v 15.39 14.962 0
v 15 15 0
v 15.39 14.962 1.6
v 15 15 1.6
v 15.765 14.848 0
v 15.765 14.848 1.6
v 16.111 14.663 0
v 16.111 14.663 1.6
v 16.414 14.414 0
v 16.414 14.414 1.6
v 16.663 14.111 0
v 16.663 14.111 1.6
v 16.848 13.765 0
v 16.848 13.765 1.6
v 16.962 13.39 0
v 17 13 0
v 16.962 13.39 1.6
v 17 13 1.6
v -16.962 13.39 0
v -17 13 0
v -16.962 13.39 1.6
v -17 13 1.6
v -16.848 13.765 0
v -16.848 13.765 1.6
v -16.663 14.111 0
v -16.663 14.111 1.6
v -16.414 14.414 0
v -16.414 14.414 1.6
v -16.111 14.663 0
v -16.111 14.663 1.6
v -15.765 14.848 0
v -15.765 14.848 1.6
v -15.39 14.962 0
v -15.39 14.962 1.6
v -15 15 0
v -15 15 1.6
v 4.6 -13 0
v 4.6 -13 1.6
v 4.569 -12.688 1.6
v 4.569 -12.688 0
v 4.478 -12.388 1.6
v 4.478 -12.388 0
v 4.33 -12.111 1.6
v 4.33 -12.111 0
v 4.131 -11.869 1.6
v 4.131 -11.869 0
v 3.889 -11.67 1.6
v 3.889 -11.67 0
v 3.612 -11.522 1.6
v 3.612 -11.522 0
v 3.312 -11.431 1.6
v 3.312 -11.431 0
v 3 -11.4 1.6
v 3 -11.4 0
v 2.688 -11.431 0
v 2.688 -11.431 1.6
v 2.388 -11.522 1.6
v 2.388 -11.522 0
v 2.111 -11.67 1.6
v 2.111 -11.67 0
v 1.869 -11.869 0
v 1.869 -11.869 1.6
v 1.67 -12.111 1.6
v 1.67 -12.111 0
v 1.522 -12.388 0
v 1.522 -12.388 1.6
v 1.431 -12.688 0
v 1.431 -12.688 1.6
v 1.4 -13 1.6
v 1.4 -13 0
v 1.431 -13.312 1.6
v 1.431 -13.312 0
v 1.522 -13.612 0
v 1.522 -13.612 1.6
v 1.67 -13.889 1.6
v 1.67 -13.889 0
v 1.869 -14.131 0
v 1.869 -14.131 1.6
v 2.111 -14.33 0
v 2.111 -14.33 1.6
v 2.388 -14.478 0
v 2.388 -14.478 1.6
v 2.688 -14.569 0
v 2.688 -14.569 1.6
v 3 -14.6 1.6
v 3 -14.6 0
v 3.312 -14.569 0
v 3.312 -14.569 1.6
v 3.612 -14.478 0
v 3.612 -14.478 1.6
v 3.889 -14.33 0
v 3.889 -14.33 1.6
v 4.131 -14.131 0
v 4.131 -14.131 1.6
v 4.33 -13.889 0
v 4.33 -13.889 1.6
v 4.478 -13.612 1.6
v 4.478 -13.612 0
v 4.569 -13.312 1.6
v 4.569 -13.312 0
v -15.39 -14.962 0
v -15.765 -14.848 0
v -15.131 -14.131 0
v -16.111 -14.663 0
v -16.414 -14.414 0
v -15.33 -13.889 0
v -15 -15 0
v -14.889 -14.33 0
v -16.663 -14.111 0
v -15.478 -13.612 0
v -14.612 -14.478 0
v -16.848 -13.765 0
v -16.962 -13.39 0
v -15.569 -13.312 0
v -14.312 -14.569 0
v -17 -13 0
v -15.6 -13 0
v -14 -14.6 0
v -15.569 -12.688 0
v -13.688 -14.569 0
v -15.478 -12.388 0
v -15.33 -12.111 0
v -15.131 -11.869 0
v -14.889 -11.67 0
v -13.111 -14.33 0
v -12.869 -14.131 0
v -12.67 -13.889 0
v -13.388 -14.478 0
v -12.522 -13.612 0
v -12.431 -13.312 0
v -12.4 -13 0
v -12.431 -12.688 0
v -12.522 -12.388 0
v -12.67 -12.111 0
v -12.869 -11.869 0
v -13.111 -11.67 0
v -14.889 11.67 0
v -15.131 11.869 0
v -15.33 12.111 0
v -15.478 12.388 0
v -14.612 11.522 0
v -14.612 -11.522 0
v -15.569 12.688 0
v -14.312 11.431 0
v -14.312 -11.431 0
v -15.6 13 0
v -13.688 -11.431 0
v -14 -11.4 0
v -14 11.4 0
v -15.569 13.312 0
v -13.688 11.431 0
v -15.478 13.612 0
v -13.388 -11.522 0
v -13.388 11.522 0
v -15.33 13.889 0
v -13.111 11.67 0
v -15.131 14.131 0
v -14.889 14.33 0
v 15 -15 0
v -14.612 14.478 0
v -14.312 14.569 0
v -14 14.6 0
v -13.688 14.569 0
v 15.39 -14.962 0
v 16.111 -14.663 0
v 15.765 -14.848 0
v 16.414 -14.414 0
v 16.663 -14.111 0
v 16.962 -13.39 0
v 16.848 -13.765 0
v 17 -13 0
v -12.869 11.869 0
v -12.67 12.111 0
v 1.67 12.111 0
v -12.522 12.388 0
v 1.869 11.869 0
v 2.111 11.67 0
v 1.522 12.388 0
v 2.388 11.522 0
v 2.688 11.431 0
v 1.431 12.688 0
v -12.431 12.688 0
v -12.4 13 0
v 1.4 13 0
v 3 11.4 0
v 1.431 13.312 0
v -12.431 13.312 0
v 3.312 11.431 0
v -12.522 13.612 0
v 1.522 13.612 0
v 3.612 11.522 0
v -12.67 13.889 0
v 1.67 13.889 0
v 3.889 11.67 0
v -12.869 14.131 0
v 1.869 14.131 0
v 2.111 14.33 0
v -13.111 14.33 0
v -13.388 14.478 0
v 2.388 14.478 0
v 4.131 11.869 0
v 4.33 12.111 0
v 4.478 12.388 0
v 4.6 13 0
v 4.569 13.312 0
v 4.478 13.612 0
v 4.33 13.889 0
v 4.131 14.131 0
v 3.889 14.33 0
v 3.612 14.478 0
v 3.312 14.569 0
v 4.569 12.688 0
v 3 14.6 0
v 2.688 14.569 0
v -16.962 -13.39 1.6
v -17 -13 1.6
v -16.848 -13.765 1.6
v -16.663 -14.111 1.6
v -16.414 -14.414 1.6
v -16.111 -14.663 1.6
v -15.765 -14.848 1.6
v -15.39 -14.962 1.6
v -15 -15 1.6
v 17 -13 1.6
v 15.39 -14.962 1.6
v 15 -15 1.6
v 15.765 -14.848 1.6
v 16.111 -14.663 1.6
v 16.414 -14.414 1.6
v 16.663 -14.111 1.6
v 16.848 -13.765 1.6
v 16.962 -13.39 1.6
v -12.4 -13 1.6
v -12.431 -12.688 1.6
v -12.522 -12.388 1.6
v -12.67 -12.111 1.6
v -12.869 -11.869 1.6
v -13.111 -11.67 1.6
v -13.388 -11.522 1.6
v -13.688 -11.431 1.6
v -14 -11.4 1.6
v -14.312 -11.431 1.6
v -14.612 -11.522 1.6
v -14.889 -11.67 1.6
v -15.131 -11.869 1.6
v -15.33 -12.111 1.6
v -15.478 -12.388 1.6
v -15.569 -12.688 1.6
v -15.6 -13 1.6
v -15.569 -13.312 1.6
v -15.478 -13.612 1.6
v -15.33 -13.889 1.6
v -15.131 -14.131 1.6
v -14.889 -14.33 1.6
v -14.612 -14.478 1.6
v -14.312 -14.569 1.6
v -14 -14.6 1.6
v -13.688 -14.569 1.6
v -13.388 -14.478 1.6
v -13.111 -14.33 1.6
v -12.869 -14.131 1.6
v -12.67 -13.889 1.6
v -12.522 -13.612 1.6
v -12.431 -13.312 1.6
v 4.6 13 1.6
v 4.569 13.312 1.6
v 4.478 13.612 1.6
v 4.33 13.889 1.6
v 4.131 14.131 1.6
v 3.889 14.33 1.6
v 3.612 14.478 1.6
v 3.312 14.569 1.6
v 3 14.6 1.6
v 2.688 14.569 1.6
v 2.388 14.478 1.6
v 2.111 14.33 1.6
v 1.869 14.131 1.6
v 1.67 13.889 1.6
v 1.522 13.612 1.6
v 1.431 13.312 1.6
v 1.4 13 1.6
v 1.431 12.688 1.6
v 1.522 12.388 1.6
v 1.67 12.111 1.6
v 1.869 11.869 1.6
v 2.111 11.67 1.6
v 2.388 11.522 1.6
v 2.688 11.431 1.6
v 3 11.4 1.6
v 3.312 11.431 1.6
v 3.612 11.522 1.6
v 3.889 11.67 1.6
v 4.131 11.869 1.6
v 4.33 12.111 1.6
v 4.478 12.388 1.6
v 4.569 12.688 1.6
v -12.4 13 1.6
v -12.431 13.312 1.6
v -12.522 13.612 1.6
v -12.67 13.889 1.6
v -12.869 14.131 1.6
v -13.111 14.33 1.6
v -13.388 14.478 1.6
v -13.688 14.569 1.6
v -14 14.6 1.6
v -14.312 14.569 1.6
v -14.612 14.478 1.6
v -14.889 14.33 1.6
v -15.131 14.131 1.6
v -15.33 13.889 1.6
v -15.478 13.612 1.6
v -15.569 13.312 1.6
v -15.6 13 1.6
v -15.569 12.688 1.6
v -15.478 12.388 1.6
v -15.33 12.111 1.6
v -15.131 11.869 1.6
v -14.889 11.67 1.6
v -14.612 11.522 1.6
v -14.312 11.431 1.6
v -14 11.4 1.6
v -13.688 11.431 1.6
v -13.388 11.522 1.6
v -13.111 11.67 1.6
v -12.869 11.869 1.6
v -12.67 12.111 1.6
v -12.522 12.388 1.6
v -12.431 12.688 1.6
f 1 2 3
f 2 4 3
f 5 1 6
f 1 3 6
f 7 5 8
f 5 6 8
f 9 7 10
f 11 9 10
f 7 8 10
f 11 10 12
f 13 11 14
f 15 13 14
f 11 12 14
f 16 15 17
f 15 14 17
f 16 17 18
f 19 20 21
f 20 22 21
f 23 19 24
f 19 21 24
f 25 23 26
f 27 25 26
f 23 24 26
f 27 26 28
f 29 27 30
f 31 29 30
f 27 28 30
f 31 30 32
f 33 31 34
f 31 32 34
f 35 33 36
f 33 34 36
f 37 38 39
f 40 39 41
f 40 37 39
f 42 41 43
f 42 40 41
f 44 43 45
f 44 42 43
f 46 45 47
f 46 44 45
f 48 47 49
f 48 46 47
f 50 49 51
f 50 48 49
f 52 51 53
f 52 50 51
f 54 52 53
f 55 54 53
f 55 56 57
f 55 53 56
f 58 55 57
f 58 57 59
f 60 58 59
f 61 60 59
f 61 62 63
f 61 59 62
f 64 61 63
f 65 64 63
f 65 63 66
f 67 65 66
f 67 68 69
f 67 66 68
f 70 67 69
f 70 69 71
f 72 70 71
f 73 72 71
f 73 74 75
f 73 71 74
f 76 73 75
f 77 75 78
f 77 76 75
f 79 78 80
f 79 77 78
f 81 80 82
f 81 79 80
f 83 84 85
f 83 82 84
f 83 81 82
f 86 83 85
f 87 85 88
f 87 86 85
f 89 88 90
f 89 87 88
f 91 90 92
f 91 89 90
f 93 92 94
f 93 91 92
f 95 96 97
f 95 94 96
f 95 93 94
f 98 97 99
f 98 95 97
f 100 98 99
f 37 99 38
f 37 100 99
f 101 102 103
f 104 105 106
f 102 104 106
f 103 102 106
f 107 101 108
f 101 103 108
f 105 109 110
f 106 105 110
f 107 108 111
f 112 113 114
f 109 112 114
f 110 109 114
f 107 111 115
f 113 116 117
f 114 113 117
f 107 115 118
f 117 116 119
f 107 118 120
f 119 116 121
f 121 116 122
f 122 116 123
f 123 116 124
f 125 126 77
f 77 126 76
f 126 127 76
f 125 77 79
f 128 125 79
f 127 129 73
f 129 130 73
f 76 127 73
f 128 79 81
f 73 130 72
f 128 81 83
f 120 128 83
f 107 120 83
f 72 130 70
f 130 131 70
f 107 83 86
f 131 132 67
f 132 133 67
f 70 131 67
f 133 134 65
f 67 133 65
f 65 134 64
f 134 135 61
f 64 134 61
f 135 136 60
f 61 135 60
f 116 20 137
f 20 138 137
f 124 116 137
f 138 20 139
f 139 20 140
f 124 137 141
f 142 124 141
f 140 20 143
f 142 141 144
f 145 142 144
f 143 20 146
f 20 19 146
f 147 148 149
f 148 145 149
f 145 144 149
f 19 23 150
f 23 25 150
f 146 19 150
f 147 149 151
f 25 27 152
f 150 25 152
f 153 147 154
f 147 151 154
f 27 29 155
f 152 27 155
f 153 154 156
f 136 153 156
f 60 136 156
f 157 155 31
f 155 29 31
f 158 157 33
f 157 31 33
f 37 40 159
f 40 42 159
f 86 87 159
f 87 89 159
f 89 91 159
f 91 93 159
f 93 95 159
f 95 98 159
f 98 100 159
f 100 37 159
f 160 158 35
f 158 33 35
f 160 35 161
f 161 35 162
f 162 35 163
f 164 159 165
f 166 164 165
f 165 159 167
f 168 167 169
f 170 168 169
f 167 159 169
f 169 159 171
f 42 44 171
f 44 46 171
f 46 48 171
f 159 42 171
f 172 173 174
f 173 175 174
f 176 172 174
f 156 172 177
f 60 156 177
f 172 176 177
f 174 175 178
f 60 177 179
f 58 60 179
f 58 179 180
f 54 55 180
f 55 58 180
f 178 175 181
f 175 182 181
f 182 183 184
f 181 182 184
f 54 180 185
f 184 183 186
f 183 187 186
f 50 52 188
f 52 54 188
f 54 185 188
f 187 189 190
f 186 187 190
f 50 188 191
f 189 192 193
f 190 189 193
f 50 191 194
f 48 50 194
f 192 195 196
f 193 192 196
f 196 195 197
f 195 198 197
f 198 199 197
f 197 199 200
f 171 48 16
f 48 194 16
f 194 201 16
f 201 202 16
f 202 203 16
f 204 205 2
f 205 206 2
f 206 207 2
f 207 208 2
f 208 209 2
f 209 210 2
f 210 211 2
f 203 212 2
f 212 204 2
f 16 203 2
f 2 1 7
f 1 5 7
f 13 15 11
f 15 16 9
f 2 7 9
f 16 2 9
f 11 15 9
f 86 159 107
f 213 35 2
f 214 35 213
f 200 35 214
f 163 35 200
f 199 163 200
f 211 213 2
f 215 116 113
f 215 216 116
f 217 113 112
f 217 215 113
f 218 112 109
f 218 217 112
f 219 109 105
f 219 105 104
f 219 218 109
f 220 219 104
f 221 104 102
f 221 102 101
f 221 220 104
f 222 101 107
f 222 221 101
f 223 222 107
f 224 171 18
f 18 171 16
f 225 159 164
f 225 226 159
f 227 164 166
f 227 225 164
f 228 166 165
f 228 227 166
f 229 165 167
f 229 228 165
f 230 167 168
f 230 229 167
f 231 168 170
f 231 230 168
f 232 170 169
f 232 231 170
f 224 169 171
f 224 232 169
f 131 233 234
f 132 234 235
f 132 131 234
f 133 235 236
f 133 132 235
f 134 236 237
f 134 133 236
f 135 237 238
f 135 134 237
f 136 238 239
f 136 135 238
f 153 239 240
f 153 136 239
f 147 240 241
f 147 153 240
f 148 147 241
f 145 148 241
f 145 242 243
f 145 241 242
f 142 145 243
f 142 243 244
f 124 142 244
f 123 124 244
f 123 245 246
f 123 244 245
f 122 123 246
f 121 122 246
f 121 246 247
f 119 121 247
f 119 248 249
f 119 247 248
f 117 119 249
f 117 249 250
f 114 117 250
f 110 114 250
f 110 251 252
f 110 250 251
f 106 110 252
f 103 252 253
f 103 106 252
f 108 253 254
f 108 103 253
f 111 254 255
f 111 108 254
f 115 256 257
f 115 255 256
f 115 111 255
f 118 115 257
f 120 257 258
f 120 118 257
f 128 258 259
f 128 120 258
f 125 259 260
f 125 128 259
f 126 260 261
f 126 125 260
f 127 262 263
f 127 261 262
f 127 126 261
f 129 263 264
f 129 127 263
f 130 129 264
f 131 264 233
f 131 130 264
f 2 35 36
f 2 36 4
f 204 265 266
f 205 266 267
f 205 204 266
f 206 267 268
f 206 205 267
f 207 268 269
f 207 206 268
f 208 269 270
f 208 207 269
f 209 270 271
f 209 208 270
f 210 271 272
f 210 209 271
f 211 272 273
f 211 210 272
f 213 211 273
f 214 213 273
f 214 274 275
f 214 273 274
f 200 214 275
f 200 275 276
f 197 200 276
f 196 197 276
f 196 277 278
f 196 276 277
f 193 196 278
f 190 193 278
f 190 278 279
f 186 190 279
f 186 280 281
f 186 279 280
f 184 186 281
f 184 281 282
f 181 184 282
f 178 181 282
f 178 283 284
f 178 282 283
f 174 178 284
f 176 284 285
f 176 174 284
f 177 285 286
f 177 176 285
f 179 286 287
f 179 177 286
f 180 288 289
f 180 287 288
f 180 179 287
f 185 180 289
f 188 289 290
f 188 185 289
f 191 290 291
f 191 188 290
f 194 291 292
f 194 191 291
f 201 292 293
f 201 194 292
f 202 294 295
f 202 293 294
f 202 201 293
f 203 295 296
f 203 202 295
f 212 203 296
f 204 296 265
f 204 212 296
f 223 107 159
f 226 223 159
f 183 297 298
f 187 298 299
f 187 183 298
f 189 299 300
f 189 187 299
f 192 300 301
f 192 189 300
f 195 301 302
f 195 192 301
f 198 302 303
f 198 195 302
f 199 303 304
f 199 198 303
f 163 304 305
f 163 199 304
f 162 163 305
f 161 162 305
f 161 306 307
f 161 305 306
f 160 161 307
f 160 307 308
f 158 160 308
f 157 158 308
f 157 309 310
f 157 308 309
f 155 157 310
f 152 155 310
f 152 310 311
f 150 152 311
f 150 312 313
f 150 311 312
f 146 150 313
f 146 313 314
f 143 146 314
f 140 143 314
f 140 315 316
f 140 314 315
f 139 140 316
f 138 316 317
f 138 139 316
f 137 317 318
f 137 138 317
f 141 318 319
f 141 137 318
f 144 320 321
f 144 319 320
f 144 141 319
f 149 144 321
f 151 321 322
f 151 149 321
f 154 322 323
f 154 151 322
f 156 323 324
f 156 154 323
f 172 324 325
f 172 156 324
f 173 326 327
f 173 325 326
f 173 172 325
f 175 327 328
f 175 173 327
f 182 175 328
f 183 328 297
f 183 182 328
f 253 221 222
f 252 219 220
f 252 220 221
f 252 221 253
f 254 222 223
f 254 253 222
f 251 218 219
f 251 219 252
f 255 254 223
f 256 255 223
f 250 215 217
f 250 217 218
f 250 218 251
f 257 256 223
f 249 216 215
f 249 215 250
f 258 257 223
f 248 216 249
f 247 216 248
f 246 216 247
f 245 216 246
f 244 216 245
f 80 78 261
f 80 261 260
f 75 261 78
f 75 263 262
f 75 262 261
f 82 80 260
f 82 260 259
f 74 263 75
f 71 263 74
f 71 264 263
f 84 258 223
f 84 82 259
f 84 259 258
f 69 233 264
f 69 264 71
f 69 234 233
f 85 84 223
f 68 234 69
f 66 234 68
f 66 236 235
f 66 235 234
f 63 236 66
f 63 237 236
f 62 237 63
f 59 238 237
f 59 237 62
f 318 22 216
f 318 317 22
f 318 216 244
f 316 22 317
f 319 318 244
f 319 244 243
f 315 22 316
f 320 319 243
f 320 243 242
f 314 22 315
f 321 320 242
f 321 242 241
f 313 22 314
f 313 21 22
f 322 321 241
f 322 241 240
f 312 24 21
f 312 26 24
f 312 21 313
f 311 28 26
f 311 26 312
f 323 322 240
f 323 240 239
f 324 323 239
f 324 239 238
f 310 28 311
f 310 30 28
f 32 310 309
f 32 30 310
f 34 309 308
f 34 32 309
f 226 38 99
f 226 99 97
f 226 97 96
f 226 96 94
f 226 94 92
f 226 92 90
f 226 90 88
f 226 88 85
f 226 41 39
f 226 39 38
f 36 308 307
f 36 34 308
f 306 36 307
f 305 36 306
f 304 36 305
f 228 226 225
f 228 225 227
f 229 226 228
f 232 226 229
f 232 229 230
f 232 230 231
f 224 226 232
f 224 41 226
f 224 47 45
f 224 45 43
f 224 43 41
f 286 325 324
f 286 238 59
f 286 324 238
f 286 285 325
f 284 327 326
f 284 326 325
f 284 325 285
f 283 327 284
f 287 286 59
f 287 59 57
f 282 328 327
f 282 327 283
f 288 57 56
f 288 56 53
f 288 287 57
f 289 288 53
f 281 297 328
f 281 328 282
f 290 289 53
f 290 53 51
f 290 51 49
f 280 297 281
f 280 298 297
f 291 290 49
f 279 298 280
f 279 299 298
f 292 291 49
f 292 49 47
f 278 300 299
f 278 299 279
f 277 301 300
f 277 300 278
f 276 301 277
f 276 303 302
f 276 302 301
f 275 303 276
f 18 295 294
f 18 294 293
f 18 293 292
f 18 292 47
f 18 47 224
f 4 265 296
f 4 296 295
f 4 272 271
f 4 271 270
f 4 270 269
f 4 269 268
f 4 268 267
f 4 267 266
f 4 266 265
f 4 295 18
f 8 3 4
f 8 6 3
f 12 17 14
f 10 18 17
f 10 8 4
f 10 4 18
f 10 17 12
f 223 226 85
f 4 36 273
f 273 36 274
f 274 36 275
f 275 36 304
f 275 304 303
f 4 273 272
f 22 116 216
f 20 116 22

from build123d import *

# Parameters (mm, degrees)
SKETCH1_W           = 34
SKETCH1_H           = 30
BOSS_EXTRUDE1_DEPTH = 1.6
CUT_EXTRUDE1_REACH  = 24.728
SKETCH2_R           = 1.6
FILLET1_R           = 2


with BuildPart() as part:
    # Sketch1 → Boss-Extrude1 (new body)
    with BuildSketch(Plane.XY):
        Rectangle(SKETCH1_W, SKETCH1_H)
    extrude(amount=BOSS_EXTRUDE1_DEPTH)

    # Sketch2 → Cut-Extrude1 (cut, up to next)
    with BuildSketch(Plane.XY, mode=Mode.PRIVATE) as cut_extrude1_sk1:
        with Locations((-14, 13)):
            Circle(SKETCH2_R)
    cut_extrude1_tool1 = extrude(cut_extrude1_sk1.sketch, amount=CUT_EXTRUDE1_REACH, mode=Mode.PRIVATE) & part.part
    # Sketch2 → Cut-Extrude1 (cut, up to next)
    with BuildSketch(Plane.XY, mode=Mode.PRIVATE) as cut_extrude1_sk2:
        with Locations((3, 13)):
            Circle(SKETCH2_R)
    cut_extrude1_tool2 = extrude(cut_extrude1_sk2.sketch, amount=CUT_EXTRUDE1_REACH, mode=Mode.PRIVATE) & part.part
    # Sketch2 → Cut-Extrude1 (cut, up to next)
    with BuildSketch(Plane.XY, mode=Mode.PRIVATE) as cut_extrude1_sk3:
        with Locations((3, -13)):
            Circle(SKETCH2_R)
    cut_extrude1_tool3 = extrude(cut_extrude1_sk3.sketch, amount=CUT_EXTRUDE1_REACH, mode=Mode.PRIVATE) & part.part
    # Sketch2 → Cut-Extrude1 (cut, up to next)
    with BuildSketch(Plane.XY, mode=Mode.PRIVATE) as cut_extrude1_sk4:
        with Locations((-14, -13)):
            Circle(SKETCH2_R)
    cut_extrude1_tool4 = extrude(cut_extrude1_sk4.sketch, amount=CUT_EXTRUDE1_REACH, mode=Mode.PRIVATE) & part.part
    add(cut_extrude1_tool1.solids().sort_by_distance((-14, 13, 0))[0], mode=Mode.SUBTRACT)
    add(cut_extrude1_tool2.solids().sort_by_distance((3, 13, 0))[0], mode=Mode.SUBTRACT)
    add(cut_extrude1_tool3.solids().sort_by_distance((3, -13, 0))[0], mode=Mode.SUBTRACT)
    add(cut_extrude1_tool4.solids().sort_by_distance((-14, -13, 0))[0], mode=Mode.SUBTRACT)

    # Fillet1
    fillet1_edges = [part.edges().sort_by_distance(p)[0] for p in [
        (17, -15, 0.8),
        (-17, -15, 0.8),
        (-17, 15, 0.8),
        (17, 15, 0.8),
    ]]
    fillet(fillet1_edges, radius=FILLET1_R)


solid = part.part
